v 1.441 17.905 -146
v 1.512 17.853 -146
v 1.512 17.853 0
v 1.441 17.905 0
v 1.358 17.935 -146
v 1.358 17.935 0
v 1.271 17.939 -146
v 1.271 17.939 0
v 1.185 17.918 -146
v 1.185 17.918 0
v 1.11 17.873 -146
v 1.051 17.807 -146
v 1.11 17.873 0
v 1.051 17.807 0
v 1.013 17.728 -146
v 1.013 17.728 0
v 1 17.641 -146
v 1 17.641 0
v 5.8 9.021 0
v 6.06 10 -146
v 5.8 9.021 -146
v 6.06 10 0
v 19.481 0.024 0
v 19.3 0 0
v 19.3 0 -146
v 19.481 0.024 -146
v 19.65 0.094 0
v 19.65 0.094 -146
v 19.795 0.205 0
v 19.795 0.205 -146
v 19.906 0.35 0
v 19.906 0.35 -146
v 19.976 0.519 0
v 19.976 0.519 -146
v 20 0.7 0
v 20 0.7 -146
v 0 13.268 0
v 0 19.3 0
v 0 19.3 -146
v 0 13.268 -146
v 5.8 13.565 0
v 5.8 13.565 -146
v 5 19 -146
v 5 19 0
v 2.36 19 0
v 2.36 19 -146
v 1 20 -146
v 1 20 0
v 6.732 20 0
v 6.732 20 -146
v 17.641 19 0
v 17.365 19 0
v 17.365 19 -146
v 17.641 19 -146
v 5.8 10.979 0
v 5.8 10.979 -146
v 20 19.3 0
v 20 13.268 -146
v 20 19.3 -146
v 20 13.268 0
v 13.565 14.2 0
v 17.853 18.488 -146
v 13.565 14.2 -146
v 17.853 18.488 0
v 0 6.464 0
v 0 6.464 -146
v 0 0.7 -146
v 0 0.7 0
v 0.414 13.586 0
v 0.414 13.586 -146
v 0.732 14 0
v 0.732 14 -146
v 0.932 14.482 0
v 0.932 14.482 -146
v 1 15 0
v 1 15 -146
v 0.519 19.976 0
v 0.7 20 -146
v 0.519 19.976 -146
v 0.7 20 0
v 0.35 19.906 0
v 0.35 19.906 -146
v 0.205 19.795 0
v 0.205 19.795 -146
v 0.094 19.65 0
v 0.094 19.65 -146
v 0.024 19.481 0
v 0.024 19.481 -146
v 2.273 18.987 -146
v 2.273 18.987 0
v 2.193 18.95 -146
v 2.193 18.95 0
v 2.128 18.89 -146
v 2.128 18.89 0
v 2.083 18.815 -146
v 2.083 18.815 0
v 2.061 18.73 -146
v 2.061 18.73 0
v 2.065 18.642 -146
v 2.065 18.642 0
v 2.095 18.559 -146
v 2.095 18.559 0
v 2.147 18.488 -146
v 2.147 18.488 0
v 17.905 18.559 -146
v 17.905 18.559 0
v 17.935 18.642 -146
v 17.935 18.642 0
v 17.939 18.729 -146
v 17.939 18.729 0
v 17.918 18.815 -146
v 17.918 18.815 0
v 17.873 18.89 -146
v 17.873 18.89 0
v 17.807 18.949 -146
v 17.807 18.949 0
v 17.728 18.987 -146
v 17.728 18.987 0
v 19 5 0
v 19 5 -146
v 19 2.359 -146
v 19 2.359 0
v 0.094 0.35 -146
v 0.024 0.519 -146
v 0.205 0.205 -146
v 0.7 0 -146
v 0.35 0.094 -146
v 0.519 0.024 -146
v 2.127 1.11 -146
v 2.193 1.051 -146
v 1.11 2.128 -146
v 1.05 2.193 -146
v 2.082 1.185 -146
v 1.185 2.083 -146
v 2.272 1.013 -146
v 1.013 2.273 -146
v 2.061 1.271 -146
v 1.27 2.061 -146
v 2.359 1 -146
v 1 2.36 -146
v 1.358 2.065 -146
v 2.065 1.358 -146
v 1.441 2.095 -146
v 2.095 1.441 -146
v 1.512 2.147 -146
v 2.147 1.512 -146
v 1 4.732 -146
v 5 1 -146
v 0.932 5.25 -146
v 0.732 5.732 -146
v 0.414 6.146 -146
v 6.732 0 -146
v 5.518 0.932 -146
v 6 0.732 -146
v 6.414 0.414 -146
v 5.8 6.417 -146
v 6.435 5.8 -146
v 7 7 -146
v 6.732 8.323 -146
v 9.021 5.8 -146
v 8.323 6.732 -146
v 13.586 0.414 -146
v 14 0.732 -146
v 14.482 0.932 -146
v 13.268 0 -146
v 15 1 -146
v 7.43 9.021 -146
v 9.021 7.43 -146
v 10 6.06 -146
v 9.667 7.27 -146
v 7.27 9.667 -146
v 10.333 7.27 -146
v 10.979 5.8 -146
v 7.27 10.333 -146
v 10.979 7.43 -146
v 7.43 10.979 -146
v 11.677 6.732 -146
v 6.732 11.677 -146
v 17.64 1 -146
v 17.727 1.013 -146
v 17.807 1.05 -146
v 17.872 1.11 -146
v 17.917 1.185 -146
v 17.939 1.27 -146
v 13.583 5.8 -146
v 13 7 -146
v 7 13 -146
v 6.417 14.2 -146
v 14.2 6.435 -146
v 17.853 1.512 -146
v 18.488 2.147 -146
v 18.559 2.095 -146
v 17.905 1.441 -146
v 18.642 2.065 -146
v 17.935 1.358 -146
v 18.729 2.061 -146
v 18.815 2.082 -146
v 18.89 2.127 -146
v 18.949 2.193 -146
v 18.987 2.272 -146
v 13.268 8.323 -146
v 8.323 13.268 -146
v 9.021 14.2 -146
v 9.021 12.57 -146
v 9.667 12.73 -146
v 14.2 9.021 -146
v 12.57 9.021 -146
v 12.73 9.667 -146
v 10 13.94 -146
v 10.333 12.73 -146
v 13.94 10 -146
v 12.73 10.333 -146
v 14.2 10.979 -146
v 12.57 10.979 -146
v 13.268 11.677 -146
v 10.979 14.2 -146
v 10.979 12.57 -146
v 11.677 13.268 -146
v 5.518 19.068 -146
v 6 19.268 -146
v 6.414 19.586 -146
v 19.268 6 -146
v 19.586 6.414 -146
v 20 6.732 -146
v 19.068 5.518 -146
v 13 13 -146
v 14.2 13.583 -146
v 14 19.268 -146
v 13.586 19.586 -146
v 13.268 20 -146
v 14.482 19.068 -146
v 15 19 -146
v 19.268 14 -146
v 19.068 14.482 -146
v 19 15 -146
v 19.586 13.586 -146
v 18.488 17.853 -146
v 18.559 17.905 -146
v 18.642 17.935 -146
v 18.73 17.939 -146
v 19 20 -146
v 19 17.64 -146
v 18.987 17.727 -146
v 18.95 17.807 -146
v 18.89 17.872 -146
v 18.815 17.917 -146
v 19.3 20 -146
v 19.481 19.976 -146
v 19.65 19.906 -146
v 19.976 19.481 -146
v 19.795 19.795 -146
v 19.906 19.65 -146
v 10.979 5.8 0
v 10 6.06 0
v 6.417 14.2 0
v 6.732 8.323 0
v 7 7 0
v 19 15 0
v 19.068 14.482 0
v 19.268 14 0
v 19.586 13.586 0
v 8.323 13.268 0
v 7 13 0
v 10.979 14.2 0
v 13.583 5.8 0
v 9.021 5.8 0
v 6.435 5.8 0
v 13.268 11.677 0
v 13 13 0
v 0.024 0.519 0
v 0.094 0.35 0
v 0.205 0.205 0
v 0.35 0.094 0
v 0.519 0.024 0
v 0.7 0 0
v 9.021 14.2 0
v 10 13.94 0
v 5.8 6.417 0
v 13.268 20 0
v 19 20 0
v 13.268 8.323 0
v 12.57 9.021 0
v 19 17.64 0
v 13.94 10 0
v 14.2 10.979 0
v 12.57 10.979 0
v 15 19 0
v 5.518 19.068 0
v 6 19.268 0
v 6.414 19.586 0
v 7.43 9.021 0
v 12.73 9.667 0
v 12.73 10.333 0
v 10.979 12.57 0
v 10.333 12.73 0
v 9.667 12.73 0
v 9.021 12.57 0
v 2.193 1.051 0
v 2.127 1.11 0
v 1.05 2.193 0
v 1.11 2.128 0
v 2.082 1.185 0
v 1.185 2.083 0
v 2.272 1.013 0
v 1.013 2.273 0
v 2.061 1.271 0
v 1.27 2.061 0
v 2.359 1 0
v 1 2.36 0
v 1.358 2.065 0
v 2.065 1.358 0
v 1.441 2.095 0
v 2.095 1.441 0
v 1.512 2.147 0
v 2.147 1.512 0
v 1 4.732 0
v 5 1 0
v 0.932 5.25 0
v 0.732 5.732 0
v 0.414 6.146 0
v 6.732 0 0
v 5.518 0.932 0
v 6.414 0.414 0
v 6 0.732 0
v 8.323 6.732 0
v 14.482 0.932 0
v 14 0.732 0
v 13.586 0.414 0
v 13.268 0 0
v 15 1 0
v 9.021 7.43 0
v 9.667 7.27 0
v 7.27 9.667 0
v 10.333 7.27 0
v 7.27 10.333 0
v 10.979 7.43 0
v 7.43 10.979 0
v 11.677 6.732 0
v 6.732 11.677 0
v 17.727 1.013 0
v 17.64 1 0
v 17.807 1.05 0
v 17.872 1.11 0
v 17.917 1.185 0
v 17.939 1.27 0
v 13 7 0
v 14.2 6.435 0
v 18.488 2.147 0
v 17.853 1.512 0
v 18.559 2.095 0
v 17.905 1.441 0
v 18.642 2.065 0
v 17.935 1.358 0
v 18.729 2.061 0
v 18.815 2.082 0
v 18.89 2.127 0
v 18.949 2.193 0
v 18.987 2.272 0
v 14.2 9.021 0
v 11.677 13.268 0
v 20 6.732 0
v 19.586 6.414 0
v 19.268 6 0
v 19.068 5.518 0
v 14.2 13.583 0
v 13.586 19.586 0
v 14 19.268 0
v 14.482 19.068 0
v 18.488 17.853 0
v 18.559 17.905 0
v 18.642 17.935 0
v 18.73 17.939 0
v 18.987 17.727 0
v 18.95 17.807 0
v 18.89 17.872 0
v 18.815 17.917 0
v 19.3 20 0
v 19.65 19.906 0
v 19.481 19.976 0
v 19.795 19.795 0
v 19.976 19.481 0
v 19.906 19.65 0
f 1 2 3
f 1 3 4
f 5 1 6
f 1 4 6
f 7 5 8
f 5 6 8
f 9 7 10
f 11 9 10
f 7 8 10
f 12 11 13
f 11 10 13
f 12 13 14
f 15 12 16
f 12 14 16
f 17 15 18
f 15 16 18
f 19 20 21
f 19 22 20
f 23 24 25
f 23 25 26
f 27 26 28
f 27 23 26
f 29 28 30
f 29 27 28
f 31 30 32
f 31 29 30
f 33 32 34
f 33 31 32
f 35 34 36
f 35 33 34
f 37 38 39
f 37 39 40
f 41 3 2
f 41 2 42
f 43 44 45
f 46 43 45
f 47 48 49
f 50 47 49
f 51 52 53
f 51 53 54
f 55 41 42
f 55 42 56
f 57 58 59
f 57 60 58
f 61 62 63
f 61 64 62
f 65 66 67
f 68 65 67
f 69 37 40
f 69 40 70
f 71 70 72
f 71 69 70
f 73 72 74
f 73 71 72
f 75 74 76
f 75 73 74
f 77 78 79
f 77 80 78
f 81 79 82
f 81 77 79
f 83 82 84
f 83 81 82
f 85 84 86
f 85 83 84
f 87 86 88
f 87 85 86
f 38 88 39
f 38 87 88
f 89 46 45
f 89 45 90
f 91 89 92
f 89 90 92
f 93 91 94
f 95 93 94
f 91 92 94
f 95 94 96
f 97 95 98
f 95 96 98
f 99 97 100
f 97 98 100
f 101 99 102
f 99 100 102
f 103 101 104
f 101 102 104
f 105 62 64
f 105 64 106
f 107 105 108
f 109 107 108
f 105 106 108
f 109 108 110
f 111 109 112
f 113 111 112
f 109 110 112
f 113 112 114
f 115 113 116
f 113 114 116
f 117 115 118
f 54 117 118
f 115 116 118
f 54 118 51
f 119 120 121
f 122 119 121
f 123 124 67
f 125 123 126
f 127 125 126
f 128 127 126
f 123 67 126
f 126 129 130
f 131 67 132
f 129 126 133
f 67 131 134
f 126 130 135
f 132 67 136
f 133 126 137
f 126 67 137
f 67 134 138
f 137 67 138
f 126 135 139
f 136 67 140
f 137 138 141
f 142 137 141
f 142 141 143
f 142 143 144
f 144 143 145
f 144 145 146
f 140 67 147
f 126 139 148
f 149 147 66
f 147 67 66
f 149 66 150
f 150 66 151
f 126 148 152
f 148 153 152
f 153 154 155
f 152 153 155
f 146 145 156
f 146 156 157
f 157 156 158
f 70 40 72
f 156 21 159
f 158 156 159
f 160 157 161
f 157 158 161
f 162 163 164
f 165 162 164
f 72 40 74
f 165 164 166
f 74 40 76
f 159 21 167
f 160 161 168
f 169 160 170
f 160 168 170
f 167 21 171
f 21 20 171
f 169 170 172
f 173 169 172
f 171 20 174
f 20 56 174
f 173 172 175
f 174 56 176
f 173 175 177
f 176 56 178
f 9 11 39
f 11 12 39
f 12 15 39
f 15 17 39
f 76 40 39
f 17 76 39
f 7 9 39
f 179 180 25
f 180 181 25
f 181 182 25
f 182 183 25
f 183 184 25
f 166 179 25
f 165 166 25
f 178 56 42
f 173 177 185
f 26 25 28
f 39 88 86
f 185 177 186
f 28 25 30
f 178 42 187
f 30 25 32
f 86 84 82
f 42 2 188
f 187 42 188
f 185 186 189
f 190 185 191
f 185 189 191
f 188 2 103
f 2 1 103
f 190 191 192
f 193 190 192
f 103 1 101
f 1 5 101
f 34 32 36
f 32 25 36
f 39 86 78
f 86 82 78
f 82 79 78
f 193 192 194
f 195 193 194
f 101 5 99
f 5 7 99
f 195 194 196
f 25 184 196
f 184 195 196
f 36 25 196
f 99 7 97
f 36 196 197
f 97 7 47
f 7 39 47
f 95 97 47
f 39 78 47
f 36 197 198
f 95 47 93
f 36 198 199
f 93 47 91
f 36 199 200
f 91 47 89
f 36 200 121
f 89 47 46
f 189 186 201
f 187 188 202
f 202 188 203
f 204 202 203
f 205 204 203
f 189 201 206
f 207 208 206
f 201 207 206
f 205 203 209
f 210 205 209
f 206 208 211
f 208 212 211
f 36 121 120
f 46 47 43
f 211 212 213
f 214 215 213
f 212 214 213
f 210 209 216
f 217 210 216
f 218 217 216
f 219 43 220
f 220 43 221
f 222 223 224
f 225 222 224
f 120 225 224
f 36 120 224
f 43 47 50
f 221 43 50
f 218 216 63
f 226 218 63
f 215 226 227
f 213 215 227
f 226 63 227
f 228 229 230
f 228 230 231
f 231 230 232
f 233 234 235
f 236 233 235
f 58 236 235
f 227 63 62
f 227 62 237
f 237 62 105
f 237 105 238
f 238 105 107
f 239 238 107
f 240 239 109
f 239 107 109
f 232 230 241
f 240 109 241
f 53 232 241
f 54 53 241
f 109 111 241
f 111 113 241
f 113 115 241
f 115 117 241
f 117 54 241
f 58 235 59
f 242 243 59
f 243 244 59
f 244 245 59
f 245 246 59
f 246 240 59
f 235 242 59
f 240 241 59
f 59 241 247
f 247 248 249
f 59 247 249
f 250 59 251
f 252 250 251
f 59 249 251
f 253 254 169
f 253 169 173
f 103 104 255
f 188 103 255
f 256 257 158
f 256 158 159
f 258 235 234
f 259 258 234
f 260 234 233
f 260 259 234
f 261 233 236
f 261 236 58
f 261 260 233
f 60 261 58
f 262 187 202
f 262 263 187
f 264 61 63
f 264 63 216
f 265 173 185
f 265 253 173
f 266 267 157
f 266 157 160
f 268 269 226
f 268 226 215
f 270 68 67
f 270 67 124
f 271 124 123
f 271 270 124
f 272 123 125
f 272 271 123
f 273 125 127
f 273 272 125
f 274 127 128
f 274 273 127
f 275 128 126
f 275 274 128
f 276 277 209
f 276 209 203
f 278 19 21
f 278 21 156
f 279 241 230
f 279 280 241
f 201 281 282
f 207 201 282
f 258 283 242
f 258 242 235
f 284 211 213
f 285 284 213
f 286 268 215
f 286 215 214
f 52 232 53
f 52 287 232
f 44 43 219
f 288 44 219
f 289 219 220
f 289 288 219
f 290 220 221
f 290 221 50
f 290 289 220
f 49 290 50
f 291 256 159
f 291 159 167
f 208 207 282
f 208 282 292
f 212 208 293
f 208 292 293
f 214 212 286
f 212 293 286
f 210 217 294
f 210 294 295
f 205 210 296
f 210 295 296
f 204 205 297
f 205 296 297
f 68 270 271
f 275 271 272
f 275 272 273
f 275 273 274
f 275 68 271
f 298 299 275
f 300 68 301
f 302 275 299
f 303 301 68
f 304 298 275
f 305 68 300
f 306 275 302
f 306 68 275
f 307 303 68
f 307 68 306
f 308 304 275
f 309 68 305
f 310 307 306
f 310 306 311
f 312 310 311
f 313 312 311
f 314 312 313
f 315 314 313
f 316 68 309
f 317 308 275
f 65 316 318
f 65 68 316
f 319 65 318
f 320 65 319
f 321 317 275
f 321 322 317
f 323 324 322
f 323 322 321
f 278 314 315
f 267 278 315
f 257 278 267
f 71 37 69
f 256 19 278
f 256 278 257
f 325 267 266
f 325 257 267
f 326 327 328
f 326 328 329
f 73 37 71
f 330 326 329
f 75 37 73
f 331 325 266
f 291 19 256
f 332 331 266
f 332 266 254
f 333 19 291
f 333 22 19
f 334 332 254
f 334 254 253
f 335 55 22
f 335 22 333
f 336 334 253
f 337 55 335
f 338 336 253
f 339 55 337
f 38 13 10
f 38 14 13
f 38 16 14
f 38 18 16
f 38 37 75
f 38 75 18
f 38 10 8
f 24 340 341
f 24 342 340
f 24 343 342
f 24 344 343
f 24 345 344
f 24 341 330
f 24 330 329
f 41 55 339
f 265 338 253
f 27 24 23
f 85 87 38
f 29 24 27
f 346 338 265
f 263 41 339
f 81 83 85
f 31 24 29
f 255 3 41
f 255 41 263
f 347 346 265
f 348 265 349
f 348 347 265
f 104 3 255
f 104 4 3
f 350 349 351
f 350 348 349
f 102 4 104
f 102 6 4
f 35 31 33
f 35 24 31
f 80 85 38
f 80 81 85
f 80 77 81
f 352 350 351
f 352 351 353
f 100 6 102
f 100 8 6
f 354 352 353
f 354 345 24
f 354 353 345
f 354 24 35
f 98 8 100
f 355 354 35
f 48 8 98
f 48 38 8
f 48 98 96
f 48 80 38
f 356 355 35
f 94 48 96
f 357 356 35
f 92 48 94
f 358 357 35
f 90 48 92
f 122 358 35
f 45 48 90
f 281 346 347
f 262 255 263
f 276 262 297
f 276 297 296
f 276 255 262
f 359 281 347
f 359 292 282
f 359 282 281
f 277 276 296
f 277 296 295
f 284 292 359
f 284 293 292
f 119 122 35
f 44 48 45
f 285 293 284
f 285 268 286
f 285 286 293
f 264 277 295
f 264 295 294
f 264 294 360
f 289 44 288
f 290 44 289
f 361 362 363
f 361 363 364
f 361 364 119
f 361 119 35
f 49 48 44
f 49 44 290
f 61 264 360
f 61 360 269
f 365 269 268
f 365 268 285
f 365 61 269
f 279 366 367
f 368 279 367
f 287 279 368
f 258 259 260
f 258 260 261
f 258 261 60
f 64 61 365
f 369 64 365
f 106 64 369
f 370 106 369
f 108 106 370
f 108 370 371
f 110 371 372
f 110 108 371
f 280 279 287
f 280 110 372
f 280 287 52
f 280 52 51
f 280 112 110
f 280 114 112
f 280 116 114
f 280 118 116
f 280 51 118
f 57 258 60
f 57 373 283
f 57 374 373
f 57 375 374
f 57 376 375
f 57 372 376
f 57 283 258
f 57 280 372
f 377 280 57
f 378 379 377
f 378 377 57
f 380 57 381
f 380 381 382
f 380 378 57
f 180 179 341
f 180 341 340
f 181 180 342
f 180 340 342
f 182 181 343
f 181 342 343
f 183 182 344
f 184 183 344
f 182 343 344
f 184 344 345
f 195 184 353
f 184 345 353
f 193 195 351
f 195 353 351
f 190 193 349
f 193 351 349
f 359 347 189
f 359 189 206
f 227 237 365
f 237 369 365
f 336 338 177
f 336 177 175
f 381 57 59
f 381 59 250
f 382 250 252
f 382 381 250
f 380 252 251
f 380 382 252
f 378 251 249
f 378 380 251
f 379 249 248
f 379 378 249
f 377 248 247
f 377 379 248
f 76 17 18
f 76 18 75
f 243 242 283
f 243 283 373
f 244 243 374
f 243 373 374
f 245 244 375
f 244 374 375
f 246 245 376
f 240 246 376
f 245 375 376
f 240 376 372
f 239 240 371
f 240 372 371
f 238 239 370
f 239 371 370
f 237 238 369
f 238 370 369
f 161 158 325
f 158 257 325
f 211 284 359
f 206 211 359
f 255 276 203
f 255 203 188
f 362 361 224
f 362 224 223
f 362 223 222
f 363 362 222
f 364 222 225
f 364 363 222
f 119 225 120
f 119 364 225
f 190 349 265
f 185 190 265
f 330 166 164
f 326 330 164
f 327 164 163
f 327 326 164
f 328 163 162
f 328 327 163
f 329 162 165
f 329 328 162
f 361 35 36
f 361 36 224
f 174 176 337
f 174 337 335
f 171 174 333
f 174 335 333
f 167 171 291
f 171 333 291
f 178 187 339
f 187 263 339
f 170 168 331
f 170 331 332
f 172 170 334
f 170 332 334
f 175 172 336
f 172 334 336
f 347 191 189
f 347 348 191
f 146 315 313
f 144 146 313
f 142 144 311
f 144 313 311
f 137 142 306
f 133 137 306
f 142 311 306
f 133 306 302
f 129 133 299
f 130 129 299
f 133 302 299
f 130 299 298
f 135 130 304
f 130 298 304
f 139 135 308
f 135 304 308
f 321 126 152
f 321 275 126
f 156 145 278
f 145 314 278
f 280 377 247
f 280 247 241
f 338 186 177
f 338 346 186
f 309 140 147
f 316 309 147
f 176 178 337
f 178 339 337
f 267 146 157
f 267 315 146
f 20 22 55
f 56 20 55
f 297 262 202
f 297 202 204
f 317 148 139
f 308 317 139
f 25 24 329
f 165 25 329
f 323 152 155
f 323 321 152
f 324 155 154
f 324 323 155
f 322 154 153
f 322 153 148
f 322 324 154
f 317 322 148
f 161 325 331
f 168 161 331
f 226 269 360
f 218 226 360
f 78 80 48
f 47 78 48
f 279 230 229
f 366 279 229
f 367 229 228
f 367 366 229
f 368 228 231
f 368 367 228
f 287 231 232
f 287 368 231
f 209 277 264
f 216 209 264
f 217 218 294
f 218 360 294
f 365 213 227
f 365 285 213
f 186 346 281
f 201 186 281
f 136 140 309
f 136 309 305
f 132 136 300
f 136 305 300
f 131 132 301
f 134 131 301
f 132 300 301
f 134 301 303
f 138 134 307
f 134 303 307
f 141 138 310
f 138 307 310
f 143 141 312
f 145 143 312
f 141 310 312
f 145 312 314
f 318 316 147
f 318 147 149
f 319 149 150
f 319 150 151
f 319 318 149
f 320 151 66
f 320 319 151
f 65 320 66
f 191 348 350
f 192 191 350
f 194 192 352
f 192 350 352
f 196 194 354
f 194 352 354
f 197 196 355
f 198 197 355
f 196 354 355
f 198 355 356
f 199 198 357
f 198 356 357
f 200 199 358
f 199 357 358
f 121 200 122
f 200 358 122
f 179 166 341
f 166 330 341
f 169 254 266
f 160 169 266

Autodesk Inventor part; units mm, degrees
ref_plane "YZ Plane" through (0, 0, 0) normal (1, 0, 0) x (0, 1, 0)
ref_plane "XZ Plane" through (0, 0, 0) normal (0, 1, 0) x (-1, 0, 0)
ref_plane "XY Plane" through (0, 0, 0) normal (0, 0, 1) x (1, 0, 0)
sketch "Boceto1" plane through (0, 0, 0) normal (0, 0, 1) x (1, 0, 0)
  line L0 (0, 20) -> (7, 20)
  line L1 (7, 20) -> (7, 21)
  line L2 (0, 20) -> (1, 20)
  line L3 (1, 17.6407) -> (1, 15)
  line L4 (-1, 13) -> (0, 13)
  line L5 (5, 19) -> (2.3598, 19)
  arc A0 (5, 19) -> (6.7321, 20) centre (5, 21) ccw
  arc A1 (0, 13.2679) -> (1, 15) centre (-1, 15) ccw
  line L6 (20, 20) -> (13, 20)
  line L7 (19.3, 20) -> (19, 20)
  line L8 (19, 17.6402) -> (19, 15)
  line L9 (21, 13) -> (20, 13)
  line L10 (13, 20) -> (13, 21)
  line L11 (15, 19) -> (18.365, 19)
  arc A2 (13.2679, 20) -> (15, 19) centre (15, 21) ccw
  arc A3 (19, 15) -> (20, 13.2679) centre (21, 15) ccw
  line L12 (0.7, 0) -> (7, 0)
  line L13 (-1, 8.6378) -> (0, 8.6378)
  line L14 (7, 0) -> (7, -1)
  line L15 (5, 1) -> (2.3593, 1)
  line L16 (19.3, 0) -> (13, 0)
  line L17 (13, 0) -> (13, -1)
  line L18 (15, 1) -> (17.6402, 1)
  line L19 (19, 5) -> (19, 2.3593)
  arc A4 (20, 6.7321) -> (19, 5) centre (21, 5) ccw
  arc A5 (15, 1) -> (13.2679, 0) centre (15, -1) ccw
  arc A6 (6.7321, 0) -> (5, 1) centre (5, -1) ccw
  line L20 (20, 20) -> (13, 20)
  line L21 (7, 20) -> (0.7, 20)
  line L22 (0, 19.3) -> (0, 13)
  line L23 (0, 6.4641) -> (0, 0.7)
  line L24 (20, 0.7) -> (20, 6.7321)
  line L25 (20, 13) -> (20, 19.3)
  line L26 (0, 0) -> (7, 0)
  line L27 (13, 0) -> (20, 0)
  line L28 (17.6407, 19) -> (17.365, 19)
  line L29 (17.8529, 18.4879) -> (13.565, 14.2)
  line L30 (18.4883, 17.8528) -> (14.2, 13.5832)
  line L31 (1.5121, 17.8529) -> (5.8, 13.565)
  line L32 (2.1472, 18.4883) -> (6.4168, 14.2)
  line L33 (2.1471, 1.5121) -> (6.435, 5.8)
  line L34 (1.5117, 2.1472) -> (5.8, 6.4168)
  line L35 (18.4879, 2.1471) -> (14.2, 6.435)
  line L36 (17.8528, 1.5117) -> (13.5832, 5.8)
  line L37 (13, 13) -> (11.6766, 13.2679)
  line L38 (11.6766, 13.2679) -> (10.9786, 12.57)
  line L39 (13, 13) -> (13.2679, 11.6766)
  line L40 (13.2679, 11.6766) -> (12.57, 10.9786)
  line L41 (6.7321, 11.6766) -> (7.43, 10.9786)
  line L42 (7, 13) -> (6.7321, 11.6766)
  line L43 (7, 13) -> (8.3234, 13.2679)
  line L44 (8.3234, 13.2679) -> (9.0214, 12.57)
  line L45 (8.3234, 6.7321) -> (9.0214, 7.43)
  line L46 (7, 7) -> (8.3234, 6.7321)
  line L47 (7, 7) -> (6.7321, 8.3234)
  line L48 (6.7321, 8.3234) -> (7.43, 9.0214)
  line L49 (13.2679, 8.3234) -> (12.57, 9.0214)
  line L50 (13, 7) -> (13.2679, 8.3234)
  line L51 (13, 7) -> (11.6766, 6.7321)
  line L52 (11.6766, 6.7321) -> (10.9786, 7.43)
  line L53 (7, 13) -> (5.8, 14.2) construction
  line L54 (5.8, 5.8) -> (7, 7) construction
  line L55 (14.2, 5.8) -> (13, 7) construction
  line L56 (11.9445, 8.0555) -> (8.0555, 11.9445) construction
  line L57 (8.0555, 8.0555) -> (11.9445, 11.9445) construction
  line L58 (13, 13) -> (14.2, 14.2) construction
  arc A7 (10.9786, 12.57) -> (9.0214, 12.57) centre (10, 10) ccw
  arc A8 (12.57, 9.0214) -> (12.57, 10.9786) centre (10, 10) ccw
  arc A9 (7.43, 10.9786) -> (7.43, 9.0214) centre (10, 10) ccw
  arc A10 (9.0214, 7.43) -> (10.9786, 7.43) centre (10, 10) ccw
  line L59 (13.94, 10) -> (14.2, 10.9786)
  line L60 (13.94, 10) -> (14.2, 9.0214)
  line L61 (14.2, 6.435) -> (14.2, 9.0214)
  line L62 (14.2, 10.9786) -> (14.2, 13.5832)
  line L63 (10, 13.94) -> (10.9786, 14.2)
  line L64 (10.9786, 14.2) -> (10, 13.94)
  line L65 (10, 13.94) -> (9.0214, 14.2)
  line L66 (6.06, 10) -> (5.8, 10.9786)
  line L67 (6.06, 10) -> (5.8, 9.0214)
  line L68 (10, 6.06) -> (10.9786, 5.8)
  line L69 (10, 6.06) -> (9.0214, 5.8)
  line L70 (6.435, 5.8) -> (9.0214, 5.8)
  line L71 (10.9786, 5.8) -> (13.5832, 5.8)
  line L72 (5.8, 13.565) -> (5.8, 10.9786)
  line L73 (5.8, 9.0214) -> (5.8, 6.4168)
  line L74 (13.565, 14.2) -> (10.9786, 14.2)
  line L75 (9.0214, 14.2) -> (6.4168, 14.2)
  line L76 (1, 2.3598) -> (1, 4.7321)
  arc A11 (1, 4.7321) -> (0, 6.4641) centre (-1, 4.7321) ccw
  arc A12 (0.7, 20) -> (0, 19.3) centre (0.7, 19.3) ccw
  arc A13 (20, 19.3) -> (19.3, 20) centre (19.3, 19.3) ccw
  arc A14 (19.3, 0) -> (20, 0.7) centre (19.3, 0.7) ccw
  arc A15 (0, 0.7) -> (0.7, 0) centre (0.7, 0.7) ccw
  arc A16 (2.3598, 19) -> (2.1472, 18.4883) centre (2.3598, 18.7) ccw
  arc A17 (1.5121, 17.8529) -> (1, 17.6407) centre (1.3, 17.6407) ccw
  arc A18 (17.8529, 18.4879) -> (17.6407, 19) centre (17.6407, 18.7) ccw
  arc A19 (19, 17.6402) -> (18.4883, 17.8528) centre (18.7, 17.6402) ccw
  arc A20 (18.4879, 2.1471) -> (19, 2.3593) centre (18.7, 2.3593) ccw
  arc A21 (17.6402, 1) -> (17.8528, 1.5117) centre (17.6402, 1.3) ccw
  arc A22 (2.1471, 1.5121) -> (2.3593, 1) centre (2.3593, 1.3) ccw
  arc A23 (1, 2.3598) -> (1.5117, 2.1472) centre (1.3, 2.3598) ccw
  point P0 (7, 19)
  point P1 (1, 13)
  point P2 (19, 13)
  point P3 (1, 1.6378)
  point P4 (1, 8.6378)
  point P5 (7, 1)
  point P6 (13, 1)
  point P7 (19, 1.635)
  point P8 (1, 18.365)
  point P9 (19, 18.3622)
  point P10 (19.6406, 19)
  point P11 (1, 19.6406)
  point P12 (0.3594, 1)
  point P13 (19, 0.3594)
  point P14 (1.6378, 19)
  point P15 (1.635, 1)
  point P16 (18.3622, 1)
  dimension "d1" = 20
  dimension "d2" = 20
  dimension "d5" = 7
  dimension "d6" = 1
  dimension "d7" = 1
  dimension "d8" = 7
  dimension "d9" = 2
  dimension "d10" = 2
  dimension "d11" = 7
  dimension "d12" = 1
  dimension "d13" = 7
  dimension "d14" = 2
  dimension "d15" = 7
  dimension "d16" = 1
  dimension "d17" = 7
  dimension "d20" = 8.4
  dimension "d21" = 8.4
  dimension "d23" = 0.9
  dimension "d26" = 360
  dimension "d30" = 360
  dimension "d38" = 2
  dimension "d41" = 0.7
  dimension "d42" = 0.3
extrude "Extrusión3" add sketch "Boceto1" against normal blind 146
properties part number "PerfilBaseJohan"
